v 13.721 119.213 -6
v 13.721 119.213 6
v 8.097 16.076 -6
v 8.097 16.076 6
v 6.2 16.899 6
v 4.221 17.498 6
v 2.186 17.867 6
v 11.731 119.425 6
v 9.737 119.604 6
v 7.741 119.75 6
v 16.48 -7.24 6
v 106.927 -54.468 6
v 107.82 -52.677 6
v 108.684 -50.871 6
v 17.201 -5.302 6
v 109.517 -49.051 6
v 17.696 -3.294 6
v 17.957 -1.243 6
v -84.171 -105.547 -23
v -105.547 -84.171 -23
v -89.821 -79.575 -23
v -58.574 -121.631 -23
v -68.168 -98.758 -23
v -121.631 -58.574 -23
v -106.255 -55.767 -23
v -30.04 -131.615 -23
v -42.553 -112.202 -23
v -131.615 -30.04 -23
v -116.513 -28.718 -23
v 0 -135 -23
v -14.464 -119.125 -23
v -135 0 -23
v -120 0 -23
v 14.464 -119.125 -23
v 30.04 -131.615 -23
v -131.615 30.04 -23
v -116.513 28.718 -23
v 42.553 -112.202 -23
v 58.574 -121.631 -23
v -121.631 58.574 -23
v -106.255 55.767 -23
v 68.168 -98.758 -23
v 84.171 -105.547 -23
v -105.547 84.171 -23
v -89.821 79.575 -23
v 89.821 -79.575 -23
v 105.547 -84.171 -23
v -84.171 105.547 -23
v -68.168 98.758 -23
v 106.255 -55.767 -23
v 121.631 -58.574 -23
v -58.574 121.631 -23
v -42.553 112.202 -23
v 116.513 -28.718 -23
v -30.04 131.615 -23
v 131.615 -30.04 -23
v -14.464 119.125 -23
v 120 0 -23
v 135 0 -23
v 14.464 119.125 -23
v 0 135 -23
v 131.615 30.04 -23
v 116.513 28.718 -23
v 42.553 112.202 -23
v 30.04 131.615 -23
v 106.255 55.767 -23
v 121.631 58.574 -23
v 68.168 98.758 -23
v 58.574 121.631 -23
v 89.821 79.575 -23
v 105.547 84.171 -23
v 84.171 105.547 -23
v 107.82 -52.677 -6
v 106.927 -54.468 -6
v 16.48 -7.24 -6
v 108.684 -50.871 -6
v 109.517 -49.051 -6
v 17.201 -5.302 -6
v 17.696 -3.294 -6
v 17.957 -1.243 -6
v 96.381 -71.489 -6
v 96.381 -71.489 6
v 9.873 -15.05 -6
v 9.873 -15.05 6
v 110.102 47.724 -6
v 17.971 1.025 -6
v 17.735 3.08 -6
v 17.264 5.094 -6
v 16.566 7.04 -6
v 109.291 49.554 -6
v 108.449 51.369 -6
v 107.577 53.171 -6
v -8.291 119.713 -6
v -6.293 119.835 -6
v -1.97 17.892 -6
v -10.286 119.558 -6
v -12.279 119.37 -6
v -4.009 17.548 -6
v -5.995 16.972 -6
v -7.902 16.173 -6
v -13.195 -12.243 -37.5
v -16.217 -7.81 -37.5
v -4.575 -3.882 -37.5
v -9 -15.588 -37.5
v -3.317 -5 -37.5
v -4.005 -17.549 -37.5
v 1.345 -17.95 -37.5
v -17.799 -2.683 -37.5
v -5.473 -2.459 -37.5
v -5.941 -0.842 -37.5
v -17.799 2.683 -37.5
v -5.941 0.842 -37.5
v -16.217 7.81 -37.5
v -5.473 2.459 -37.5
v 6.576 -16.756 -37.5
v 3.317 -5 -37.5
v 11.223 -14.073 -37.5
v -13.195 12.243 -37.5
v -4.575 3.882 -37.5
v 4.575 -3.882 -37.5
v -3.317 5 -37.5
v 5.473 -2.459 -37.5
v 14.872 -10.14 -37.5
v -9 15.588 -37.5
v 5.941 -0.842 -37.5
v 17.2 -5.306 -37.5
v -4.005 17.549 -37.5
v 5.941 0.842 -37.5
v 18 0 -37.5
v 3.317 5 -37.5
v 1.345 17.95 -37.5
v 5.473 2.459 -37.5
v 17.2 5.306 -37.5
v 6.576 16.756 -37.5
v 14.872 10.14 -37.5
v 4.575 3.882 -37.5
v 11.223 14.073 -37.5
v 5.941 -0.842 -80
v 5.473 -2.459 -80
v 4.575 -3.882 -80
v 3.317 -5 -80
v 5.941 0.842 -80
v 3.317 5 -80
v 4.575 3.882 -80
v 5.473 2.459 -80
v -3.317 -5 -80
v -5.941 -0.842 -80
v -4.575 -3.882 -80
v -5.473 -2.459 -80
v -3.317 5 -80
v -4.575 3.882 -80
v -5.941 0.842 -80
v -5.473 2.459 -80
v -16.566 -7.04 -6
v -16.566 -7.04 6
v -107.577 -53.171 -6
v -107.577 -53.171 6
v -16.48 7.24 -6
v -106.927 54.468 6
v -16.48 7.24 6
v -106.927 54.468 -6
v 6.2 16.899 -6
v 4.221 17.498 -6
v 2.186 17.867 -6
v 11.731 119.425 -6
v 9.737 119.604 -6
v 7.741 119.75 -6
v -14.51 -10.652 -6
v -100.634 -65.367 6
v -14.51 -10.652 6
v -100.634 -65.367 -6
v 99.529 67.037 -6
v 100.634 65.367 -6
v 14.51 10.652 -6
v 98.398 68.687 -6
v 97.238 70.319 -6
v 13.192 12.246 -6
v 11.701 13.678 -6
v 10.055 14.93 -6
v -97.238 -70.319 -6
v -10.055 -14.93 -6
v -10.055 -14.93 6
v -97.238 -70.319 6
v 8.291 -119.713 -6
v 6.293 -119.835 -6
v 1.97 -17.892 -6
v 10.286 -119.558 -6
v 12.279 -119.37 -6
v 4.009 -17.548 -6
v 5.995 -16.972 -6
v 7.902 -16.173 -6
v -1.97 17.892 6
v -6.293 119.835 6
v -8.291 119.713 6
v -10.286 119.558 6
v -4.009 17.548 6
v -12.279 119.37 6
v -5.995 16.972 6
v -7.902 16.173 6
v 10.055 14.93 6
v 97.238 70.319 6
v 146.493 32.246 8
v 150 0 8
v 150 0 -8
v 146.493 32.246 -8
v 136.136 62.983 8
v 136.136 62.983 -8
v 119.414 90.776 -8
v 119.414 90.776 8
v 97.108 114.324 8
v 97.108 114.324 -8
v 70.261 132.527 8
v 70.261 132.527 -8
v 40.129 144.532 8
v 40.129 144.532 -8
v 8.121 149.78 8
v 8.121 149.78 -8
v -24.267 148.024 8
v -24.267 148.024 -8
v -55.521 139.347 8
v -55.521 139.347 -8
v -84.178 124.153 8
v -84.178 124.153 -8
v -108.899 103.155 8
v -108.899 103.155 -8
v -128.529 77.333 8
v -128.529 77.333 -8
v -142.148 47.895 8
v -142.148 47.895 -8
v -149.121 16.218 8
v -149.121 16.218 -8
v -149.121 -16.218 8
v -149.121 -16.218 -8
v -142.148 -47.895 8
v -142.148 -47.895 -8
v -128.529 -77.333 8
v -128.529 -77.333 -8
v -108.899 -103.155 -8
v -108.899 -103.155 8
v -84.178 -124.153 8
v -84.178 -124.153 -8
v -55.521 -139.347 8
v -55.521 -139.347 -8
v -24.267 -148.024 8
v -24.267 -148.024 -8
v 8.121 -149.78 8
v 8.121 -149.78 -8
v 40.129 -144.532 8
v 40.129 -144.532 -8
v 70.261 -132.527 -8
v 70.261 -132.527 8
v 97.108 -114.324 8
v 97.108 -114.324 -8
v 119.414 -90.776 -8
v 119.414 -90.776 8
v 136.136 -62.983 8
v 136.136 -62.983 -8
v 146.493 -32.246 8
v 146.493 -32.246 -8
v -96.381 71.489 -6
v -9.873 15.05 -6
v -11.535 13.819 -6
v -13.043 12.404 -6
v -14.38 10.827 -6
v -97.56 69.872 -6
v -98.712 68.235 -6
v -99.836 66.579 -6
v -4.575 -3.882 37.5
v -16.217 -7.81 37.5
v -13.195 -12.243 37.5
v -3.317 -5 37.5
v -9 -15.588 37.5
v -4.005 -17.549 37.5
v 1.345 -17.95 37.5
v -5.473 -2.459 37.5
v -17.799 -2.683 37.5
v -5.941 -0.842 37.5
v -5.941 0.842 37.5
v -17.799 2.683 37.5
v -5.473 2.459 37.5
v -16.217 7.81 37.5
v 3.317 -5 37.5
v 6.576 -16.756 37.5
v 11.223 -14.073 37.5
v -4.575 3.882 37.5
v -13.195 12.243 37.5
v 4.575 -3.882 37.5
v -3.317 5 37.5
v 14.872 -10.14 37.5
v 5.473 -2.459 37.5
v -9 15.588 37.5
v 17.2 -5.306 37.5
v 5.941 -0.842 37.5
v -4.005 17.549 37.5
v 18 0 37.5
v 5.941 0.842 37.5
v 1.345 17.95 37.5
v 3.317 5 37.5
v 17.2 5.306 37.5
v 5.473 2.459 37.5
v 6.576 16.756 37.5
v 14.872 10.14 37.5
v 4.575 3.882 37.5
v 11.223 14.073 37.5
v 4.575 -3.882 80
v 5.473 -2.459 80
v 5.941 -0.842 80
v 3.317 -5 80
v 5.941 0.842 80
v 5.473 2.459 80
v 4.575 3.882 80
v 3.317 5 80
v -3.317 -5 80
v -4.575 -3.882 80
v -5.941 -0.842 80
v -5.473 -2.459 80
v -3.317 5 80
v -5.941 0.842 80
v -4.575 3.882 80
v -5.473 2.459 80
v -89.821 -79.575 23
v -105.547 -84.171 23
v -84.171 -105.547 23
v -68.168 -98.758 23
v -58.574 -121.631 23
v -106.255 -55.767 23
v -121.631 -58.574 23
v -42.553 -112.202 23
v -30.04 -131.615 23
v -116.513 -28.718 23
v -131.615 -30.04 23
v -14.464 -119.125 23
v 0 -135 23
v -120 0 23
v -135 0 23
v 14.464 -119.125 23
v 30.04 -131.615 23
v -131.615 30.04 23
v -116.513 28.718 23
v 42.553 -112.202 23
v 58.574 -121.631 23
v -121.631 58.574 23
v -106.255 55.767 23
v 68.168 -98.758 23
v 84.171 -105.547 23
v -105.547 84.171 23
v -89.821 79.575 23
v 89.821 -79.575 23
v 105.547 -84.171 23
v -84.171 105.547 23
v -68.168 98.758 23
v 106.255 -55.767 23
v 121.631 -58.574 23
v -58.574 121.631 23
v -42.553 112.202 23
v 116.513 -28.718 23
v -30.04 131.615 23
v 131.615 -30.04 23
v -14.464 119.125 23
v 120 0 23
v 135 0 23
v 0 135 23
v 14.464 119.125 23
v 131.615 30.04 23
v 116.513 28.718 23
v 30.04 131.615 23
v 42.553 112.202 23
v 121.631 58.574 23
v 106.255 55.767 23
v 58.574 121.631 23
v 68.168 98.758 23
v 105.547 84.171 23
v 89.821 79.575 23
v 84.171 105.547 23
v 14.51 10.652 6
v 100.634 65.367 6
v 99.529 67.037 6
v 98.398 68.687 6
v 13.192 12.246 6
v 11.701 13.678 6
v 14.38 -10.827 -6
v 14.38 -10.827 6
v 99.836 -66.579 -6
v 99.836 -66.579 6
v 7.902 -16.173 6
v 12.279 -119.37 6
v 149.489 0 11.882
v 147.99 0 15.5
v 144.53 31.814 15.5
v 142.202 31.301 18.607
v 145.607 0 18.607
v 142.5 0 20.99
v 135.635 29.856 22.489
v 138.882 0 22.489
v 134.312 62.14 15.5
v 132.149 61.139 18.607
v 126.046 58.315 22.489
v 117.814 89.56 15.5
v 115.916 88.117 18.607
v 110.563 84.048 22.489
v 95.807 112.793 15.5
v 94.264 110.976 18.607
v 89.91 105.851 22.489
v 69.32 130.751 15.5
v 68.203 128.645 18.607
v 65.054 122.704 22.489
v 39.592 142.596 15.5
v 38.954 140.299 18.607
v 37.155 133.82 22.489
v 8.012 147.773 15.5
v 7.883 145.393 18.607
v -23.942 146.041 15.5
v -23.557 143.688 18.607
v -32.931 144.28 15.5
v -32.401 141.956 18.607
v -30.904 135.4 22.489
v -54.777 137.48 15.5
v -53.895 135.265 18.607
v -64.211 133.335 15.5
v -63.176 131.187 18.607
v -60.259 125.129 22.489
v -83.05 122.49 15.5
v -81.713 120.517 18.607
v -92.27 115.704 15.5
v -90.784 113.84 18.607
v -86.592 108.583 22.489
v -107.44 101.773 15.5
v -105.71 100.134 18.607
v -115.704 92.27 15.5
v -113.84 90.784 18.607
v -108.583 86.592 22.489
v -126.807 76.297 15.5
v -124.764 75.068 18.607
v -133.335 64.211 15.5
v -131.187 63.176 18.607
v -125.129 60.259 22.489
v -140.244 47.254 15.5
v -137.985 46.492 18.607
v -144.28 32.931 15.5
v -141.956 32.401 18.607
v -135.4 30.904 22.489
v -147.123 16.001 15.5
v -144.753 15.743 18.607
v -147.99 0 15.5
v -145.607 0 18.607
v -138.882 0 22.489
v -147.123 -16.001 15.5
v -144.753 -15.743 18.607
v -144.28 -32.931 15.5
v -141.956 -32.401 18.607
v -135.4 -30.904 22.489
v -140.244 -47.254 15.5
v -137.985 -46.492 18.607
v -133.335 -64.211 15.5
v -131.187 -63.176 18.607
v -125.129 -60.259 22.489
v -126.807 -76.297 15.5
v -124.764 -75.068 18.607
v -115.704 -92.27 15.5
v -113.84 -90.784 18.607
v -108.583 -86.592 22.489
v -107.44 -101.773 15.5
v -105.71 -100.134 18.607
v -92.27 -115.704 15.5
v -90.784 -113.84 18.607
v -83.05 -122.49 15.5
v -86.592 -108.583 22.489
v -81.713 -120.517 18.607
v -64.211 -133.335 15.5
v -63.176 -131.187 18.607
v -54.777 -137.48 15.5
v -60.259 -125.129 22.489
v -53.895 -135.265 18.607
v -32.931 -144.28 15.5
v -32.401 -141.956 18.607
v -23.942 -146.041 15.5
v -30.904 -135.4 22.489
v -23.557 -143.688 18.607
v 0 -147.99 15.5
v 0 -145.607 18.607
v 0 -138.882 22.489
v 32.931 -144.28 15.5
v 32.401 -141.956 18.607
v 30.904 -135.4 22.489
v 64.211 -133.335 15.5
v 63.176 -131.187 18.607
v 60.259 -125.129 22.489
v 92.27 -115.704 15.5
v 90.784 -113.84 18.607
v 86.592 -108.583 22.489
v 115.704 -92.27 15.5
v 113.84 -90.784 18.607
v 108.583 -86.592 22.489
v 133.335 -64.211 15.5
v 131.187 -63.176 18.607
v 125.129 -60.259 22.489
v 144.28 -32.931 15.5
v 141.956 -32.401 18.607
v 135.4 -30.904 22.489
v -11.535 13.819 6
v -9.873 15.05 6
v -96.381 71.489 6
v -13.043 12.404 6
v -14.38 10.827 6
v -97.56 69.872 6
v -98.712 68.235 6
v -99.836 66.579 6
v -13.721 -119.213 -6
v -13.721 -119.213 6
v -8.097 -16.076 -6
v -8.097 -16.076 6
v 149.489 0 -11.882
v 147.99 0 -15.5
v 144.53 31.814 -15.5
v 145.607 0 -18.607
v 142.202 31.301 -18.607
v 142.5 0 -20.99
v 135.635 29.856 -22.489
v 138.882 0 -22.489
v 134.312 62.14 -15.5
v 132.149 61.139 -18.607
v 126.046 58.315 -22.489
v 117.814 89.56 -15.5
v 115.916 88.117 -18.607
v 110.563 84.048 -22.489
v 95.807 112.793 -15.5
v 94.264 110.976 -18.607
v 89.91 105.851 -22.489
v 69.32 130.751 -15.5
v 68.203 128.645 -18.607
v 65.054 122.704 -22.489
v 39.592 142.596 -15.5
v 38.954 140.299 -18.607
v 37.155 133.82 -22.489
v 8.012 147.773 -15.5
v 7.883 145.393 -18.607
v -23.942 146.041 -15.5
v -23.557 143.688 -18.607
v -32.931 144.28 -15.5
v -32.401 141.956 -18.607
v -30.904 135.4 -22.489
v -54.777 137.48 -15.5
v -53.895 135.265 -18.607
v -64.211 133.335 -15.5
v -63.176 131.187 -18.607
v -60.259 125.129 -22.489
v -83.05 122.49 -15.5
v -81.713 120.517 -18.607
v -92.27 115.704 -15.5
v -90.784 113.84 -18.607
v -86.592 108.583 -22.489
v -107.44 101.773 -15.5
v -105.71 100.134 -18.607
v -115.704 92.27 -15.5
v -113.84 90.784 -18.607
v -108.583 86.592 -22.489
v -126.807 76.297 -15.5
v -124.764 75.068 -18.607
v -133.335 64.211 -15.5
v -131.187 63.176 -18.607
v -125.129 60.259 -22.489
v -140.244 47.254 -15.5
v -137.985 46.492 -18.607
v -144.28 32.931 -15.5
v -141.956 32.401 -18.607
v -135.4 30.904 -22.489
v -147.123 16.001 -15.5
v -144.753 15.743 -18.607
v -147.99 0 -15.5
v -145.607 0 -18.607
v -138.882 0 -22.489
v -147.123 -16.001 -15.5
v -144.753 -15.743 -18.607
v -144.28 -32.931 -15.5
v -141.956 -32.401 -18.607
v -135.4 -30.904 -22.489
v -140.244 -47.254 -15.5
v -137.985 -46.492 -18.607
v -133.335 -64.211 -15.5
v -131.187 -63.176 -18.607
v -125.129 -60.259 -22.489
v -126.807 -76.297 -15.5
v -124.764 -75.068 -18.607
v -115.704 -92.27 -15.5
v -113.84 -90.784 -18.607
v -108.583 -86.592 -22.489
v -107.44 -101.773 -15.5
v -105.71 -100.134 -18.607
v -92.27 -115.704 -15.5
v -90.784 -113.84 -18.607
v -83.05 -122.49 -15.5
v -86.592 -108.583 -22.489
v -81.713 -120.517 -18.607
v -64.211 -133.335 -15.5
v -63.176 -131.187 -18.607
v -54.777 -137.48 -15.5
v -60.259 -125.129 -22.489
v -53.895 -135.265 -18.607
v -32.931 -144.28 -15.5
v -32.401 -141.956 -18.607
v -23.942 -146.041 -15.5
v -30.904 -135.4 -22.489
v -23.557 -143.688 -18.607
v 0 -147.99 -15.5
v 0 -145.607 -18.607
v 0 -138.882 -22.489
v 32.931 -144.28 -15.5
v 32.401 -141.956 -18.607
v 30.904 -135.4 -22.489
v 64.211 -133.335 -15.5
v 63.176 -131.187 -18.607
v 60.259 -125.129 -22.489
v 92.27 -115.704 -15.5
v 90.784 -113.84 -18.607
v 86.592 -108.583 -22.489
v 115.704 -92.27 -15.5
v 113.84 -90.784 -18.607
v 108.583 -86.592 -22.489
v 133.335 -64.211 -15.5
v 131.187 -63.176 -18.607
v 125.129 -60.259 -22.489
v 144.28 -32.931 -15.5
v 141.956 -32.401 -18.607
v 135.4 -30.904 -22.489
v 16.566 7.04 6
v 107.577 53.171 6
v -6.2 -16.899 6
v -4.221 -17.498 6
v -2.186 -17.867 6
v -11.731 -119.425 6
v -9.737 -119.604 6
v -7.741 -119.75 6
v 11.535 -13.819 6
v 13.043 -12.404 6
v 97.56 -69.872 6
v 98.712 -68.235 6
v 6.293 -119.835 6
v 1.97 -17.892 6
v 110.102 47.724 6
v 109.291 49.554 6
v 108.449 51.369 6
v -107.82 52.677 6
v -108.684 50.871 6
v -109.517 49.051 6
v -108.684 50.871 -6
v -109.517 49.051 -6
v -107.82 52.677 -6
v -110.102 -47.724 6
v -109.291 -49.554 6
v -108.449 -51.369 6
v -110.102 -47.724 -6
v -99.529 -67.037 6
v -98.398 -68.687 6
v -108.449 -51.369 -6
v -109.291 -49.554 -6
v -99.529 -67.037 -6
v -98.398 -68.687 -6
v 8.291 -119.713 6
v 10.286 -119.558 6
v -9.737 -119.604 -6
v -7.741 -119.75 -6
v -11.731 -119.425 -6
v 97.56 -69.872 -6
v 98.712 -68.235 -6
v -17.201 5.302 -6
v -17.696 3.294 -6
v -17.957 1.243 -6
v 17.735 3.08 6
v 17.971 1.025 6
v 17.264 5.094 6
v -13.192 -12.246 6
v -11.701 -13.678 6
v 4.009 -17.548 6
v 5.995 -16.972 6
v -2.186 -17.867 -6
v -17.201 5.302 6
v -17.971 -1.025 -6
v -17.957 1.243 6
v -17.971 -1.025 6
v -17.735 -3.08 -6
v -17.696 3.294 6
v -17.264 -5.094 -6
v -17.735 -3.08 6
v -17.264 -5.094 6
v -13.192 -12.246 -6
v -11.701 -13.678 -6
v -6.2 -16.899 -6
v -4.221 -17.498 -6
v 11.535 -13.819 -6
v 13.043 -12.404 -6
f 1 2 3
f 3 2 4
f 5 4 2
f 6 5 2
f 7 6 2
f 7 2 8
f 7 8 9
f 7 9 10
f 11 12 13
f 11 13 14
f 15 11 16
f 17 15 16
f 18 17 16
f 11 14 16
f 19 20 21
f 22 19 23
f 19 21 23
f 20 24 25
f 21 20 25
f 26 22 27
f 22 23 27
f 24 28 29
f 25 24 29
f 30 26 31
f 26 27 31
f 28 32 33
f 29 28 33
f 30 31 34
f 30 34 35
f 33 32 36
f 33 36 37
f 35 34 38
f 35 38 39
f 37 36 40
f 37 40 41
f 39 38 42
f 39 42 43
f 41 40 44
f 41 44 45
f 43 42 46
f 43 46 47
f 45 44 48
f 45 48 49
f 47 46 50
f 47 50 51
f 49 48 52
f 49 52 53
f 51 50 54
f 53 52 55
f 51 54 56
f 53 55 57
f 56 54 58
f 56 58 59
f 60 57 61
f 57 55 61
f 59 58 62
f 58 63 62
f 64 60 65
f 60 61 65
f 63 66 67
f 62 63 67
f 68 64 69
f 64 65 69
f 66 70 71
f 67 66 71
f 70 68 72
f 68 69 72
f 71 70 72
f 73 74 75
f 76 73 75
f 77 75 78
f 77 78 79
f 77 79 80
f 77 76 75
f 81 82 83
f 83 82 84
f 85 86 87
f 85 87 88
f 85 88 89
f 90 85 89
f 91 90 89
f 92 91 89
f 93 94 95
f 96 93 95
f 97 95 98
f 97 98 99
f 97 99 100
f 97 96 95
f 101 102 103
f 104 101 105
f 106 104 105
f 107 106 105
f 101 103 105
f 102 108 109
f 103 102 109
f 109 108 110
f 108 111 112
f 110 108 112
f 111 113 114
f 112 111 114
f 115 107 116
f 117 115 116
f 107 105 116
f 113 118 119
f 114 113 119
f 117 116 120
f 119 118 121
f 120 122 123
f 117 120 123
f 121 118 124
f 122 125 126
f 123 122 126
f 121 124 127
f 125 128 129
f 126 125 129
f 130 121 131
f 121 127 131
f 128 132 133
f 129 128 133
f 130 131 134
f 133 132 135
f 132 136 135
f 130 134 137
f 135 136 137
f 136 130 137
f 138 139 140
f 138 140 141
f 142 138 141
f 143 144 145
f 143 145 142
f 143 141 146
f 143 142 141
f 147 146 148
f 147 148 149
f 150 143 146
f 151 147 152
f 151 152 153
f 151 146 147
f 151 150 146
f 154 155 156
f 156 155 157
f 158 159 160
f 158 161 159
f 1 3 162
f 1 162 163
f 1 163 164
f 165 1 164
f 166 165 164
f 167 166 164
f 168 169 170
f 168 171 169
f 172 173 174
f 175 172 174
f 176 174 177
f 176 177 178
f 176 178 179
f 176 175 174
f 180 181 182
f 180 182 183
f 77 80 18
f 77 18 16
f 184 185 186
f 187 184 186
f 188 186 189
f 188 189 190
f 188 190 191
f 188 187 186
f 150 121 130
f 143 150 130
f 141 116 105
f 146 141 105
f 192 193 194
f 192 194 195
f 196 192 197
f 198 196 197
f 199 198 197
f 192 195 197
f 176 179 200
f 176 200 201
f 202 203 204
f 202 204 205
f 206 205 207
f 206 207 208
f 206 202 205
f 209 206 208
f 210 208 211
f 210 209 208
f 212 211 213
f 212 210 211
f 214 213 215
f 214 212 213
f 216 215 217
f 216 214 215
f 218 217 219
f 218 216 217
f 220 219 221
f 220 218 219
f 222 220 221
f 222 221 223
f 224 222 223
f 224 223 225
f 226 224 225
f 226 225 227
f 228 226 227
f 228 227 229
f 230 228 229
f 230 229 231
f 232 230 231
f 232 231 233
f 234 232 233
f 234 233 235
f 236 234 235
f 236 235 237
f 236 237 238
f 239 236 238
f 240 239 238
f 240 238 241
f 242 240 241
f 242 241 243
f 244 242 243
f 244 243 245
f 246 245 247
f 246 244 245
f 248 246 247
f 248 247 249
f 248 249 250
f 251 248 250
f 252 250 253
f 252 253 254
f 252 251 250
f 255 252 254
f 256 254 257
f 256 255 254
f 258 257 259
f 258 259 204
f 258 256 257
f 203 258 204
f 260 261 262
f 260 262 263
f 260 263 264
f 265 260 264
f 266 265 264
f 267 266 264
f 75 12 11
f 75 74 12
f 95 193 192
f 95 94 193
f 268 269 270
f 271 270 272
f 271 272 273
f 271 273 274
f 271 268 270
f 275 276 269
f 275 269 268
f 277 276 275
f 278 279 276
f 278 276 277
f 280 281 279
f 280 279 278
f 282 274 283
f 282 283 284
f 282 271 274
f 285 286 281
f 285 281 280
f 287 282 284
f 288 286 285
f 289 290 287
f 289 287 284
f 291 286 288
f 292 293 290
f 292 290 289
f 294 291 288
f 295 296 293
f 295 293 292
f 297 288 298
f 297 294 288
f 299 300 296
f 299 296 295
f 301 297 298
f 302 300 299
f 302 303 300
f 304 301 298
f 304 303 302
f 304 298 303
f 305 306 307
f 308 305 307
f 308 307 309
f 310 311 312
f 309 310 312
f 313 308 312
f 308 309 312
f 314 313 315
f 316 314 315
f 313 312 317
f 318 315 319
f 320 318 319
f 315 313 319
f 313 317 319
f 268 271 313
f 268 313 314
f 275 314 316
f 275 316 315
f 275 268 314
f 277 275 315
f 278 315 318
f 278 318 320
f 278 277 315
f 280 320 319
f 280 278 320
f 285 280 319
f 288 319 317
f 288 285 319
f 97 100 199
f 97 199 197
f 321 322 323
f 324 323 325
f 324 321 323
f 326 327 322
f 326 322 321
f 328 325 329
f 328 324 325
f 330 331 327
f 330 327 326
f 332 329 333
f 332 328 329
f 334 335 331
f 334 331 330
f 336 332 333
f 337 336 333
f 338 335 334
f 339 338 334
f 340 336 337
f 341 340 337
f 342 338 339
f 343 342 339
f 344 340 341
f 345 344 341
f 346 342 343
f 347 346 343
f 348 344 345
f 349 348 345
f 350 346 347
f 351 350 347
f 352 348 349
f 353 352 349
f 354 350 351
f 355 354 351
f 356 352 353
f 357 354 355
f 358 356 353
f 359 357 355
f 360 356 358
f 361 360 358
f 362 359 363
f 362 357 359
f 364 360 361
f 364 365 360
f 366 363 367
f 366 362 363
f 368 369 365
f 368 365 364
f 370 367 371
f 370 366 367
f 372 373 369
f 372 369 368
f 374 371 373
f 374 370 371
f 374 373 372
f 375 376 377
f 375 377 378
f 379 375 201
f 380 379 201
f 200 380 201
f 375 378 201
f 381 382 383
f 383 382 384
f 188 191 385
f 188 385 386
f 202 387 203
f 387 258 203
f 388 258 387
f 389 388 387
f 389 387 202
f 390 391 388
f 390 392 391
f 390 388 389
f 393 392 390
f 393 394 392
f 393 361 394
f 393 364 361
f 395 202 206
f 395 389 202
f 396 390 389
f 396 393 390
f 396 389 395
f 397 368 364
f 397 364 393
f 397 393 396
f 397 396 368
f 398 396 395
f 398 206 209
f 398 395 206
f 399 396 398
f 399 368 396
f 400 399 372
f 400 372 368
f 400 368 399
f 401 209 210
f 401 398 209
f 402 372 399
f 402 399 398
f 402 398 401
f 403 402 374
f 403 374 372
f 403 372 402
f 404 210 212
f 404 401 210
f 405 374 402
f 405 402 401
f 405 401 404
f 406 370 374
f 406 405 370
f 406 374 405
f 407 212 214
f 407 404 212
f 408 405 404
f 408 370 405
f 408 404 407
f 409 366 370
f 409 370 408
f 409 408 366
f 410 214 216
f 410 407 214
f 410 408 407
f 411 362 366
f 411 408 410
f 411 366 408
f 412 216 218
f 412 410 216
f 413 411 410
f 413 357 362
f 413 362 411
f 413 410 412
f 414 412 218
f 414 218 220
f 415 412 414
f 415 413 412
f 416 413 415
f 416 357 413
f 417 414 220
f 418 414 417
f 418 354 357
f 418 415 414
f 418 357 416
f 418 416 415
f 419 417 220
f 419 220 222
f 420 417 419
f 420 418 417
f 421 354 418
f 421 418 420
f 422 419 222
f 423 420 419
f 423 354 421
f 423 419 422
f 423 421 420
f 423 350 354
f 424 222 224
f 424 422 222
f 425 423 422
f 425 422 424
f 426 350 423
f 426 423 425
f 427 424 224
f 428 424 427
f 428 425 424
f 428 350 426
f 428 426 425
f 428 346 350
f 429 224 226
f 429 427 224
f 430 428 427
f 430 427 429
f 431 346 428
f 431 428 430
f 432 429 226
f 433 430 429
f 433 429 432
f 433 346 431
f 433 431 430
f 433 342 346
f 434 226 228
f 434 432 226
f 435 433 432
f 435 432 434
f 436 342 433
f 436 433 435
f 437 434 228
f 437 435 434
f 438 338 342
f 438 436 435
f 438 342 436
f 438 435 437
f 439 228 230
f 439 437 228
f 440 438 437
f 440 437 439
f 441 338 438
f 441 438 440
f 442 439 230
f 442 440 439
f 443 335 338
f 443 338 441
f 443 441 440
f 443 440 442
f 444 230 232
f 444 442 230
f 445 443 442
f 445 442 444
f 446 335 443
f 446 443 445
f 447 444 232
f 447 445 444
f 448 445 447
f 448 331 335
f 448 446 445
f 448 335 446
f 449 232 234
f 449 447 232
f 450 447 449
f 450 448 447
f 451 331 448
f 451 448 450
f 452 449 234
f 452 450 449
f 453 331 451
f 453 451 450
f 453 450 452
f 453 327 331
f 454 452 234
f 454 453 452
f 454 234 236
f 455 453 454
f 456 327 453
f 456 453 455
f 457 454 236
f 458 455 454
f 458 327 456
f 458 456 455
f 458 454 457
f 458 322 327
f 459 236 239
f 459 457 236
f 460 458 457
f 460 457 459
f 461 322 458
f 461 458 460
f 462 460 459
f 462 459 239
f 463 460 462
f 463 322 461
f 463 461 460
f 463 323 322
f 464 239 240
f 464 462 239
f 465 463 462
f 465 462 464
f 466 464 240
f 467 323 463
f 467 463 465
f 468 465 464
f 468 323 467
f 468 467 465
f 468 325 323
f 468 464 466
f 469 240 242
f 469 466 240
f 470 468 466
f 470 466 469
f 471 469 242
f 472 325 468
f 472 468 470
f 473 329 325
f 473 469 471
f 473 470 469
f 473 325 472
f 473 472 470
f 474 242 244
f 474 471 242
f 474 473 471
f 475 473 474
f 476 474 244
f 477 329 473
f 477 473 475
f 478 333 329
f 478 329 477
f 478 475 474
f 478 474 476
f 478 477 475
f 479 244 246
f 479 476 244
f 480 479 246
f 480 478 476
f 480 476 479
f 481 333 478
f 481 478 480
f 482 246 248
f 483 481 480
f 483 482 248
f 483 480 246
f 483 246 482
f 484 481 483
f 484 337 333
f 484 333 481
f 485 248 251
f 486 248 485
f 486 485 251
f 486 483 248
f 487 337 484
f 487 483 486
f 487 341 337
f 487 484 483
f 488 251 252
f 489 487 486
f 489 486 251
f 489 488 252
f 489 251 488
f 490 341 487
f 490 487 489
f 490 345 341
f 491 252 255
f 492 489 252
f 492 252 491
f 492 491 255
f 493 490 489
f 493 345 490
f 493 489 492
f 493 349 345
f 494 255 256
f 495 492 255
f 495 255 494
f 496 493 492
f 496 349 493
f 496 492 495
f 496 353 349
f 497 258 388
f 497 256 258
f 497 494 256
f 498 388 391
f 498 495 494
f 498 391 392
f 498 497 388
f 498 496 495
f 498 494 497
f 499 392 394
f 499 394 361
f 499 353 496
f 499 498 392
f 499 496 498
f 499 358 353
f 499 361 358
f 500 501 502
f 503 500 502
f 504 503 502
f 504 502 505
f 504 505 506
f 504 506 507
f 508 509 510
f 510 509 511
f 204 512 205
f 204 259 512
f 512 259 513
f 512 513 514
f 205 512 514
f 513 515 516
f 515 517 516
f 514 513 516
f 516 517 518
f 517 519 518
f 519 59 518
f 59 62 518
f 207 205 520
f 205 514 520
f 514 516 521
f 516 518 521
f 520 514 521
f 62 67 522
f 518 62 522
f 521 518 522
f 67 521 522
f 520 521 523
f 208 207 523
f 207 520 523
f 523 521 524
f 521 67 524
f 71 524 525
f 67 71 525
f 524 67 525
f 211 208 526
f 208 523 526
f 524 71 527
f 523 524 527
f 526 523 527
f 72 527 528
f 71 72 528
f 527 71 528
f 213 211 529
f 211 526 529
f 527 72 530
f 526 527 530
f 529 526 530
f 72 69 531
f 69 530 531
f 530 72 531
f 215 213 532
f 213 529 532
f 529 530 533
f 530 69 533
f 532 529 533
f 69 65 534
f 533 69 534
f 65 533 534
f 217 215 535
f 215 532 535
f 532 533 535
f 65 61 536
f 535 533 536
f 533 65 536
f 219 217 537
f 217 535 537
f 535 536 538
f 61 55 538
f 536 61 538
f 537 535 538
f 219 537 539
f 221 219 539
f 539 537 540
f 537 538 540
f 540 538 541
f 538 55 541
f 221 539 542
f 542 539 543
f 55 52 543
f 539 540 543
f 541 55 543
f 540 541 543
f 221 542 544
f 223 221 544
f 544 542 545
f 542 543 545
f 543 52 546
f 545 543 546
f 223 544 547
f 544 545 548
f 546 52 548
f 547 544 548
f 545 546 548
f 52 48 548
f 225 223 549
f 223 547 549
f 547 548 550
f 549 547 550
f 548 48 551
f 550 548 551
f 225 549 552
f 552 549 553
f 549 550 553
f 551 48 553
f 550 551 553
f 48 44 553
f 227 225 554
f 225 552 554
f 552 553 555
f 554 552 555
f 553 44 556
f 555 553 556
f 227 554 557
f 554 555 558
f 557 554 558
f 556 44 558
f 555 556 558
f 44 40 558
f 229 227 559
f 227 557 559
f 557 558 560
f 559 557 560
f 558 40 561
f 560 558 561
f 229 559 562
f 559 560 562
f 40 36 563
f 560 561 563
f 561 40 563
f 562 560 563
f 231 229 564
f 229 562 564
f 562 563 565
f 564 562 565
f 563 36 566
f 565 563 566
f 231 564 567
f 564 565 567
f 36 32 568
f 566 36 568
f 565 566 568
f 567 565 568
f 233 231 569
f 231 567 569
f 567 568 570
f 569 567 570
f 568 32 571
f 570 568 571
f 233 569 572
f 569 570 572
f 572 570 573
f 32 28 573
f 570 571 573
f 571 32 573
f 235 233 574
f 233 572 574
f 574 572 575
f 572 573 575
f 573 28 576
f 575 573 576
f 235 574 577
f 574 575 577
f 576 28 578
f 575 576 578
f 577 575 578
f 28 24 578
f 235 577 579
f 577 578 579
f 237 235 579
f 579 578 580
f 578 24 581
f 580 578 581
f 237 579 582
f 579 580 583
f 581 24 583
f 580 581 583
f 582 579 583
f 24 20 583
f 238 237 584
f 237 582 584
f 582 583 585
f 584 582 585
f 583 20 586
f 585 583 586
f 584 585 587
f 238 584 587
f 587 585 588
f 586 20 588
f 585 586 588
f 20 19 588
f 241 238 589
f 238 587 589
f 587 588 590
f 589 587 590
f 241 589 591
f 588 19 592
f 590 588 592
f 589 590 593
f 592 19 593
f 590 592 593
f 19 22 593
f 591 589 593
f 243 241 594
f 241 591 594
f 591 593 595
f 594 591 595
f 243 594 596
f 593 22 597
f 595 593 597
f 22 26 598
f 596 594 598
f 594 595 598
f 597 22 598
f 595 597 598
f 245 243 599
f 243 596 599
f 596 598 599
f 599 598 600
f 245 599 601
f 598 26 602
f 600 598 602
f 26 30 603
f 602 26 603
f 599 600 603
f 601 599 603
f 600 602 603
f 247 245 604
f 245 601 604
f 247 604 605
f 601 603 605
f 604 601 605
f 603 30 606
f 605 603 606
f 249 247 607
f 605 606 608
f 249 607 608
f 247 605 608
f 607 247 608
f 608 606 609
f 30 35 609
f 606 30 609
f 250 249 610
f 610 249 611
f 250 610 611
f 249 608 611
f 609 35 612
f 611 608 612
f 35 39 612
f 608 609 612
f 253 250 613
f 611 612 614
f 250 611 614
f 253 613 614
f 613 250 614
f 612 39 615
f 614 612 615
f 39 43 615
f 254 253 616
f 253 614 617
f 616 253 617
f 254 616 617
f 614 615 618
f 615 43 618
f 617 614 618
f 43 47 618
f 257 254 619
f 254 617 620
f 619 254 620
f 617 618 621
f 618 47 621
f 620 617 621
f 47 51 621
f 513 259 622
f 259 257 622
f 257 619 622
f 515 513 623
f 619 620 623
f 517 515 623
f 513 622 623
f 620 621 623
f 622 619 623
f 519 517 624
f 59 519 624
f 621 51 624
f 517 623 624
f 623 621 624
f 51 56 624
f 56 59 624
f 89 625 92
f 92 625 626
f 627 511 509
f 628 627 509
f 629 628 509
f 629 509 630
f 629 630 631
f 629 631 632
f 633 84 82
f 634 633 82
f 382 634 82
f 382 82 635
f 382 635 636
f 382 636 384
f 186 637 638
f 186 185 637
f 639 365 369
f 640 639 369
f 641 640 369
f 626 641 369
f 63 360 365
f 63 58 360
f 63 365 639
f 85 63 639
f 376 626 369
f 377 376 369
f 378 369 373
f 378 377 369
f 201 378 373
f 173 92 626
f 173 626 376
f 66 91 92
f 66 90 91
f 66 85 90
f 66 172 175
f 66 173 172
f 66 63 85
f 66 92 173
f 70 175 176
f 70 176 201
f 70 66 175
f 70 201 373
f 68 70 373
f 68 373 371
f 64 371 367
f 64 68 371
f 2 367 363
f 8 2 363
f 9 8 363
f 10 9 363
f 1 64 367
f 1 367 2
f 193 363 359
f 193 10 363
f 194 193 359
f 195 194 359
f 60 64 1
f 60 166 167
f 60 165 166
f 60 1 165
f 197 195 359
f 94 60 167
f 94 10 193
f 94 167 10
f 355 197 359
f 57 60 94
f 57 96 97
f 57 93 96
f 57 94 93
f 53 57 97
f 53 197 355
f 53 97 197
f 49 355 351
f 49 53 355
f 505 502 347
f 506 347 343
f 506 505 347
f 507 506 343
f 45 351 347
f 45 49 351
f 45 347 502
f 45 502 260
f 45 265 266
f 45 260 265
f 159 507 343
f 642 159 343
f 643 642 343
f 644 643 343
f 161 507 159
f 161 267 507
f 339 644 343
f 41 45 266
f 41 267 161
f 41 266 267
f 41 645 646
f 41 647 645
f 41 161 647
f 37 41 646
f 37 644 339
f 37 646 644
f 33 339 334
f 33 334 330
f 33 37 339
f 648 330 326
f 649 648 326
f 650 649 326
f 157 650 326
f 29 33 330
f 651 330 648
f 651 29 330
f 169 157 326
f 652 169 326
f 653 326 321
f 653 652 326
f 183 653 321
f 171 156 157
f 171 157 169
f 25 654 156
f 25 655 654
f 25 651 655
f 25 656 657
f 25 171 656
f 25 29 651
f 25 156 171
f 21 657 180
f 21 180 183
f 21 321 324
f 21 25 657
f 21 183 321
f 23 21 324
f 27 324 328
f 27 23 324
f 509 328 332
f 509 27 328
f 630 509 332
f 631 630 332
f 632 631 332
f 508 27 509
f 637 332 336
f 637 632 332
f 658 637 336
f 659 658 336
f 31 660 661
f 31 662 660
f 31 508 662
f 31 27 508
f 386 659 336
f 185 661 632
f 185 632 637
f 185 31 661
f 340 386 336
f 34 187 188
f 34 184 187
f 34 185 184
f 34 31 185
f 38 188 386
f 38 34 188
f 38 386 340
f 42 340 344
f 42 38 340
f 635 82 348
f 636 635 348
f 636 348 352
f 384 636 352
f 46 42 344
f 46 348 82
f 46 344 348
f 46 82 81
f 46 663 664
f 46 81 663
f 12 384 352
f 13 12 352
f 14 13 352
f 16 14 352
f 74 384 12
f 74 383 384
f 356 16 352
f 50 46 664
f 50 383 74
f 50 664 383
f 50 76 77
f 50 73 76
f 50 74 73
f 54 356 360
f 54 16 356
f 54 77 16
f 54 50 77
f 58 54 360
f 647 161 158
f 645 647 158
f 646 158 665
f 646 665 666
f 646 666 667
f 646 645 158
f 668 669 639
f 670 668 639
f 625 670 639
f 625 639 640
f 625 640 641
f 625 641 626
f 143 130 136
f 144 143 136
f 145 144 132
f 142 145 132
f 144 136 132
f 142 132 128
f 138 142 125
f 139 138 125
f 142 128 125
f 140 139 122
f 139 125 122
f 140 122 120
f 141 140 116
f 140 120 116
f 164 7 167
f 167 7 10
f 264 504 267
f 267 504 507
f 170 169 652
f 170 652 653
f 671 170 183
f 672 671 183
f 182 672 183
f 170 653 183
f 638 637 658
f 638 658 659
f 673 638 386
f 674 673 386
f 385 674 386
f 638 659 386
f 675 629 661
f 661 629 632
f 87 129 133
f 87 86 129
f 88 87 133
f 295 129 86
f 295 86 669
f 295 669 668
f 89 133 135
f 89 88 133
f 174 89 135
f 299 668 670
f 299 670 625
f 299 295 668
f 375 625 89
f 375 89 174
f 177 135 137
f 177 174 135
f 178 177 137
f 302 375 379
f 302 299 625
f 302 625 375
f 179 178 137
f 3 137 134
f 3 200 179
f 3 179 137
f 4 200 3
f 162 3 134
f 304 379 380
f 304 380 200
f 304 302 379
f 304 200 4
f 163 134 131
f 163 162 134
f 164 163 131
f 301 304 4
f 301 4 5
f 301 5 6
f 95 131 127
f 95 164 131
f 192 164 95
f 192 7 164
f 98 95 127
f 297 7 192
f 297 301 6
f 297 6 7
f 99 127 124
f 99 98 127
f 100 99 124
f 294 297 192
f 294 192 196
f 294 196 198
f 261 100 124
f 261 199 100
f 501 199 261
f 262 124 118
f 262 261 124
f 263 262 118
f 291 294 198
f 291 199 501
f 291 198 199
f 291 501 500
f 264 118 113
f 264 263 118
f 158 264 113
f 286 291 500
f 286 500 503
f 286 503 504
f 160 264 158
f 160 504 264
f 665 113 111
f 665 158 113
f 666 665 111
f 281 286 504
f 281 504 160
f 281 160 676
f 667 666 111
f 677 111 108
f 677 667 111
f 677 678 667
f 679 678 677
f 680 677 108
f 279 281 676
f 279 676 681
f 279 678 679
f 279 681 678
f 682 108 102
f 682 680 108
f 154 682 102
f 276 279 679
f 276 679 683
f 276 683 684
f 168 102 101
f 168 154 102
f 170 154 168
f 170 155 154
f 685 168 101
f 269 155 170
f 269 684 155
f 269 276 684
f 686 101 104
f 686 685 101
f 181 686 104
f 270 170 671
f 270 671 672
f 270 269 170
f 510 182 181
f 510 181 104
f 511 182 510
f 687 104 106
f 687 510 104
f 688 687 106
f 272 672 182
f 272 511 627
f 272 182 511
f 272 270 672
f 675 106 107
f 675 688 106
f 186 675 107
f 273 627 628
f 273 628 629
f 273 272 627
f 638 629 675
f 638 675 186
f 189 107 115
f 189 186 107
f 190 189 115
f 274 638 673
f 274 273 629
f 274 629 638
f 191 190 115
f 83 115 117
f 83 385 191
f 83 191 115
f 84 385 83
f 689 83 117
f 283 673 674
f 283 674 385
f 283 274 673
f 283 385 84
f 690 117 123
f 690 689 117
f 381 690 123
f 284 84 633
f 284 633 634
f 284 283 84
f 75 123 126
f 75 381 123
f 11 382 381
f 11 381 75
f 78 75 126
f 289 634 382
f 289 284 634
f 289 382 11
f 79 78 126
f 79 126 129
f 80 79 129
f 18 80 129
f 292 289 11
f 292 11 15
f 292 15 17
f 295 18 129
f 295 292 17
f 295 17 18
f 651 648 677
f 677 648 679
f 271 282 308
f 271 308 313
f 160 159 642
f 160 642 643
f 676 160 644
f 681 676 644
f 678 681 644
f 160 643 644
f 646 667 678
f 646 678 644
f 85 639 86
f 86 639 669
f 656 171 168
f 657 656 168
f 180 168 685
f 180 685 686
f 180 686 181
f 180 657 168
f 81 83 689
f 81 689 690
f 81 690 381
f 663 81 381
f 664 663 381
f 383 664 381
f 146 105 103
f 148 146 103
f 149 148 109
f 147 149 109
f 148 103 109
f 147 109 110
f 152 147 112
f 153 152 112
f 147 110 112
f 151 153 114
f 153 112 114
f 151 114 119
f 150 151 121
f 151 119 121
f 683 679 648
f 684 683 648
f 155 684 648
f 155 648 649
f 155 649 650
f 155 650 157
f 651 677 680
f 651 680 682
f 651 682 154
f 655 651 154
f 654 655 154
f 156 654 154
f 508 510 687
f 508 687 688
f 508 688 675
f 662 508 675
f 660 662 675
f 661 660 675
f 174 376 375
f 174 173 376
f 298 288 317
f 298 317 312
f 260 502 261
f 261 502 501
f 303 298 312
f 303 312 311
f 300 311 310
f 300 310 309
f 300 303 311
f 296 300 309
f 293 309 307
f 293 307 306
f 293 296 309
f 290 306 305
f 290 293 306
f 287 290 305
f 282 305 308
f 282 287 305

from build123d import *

# Parameters (mm, degrees)
SKETCH1_R           = 18
BOSS_EXTRUDE1_DEPTH = 37.5
SKETCH2_R           = 150
SKETCH2_R_2         = 120
BOSS_EXTRUDE2_DEPTH = 23
BOSS_EXTRUDE3_DEPTH = 6
CIRPATTERN15_COUNT  = 6
FILLET1_R           = 15
BOSS_EXTRUDE4_DEPTH = 42.5


with BuildPart() as part:
    # Sketch1 → Boss-Extrude1 (new, symmetric)
    with BuildSketch(Plane.XY):
        Circle(SKETCH1_R)
    extrude(amount=BOSS_EXTRUDE1_DEPTH, both=True)



with BuildPart() as body_2:
    # Sketch2 → Boss-Extrude2 (new, symmetric)
    with BuildSketch(Plane.XY):
        Circle(SKETCH2_R)
        Circle(SKETCH2_R_2, mode=Mode.SUBTRACT)
    extrude(amount=BOSS_EXTRUDE2_DEPTH, both=True)


with BuildPart() as part_1:
    add(part.part)

    add(body_2.part)  # Boss-Extrude3 merges body 2
    # Sketch3 → Boss-Extrude3 (add, symmetric)
    with BuildSketch(Plane.XY):
        with BuildLine():
            Line((-6.292975555, 119.834879975), (-1.969902622, 17.891883178))
            ThreePointArc((-1.969902622, 17.891883178), (-5.010440879, 17.288593991), (-7.902385067, 16.172578961))
            Line((-7.902385067, 16.172578961), (-12.278660753, 119.370157452))
            ThreePointArc((-12.278660753, 119.370157452), (-9.288724915, 119.639958164), (-6.292975555, 119.834879975))
        make_face()
        with BuildLine():
            Line((13.720864234, 119.212993774), (8.097322617, 16.075862852))
            ThreePointArc((8.097322617, 16.075862852), (5.2190816, 17.226757886), (2.18605888, 17.866760942))
            Line((2.18605888, 17.866760942), (7.741234625, 119.750045037))
            ThreePointArc((7.741234625, 119.750045037), (10.734408595, 119.51892098), (13.720864234, 119.212993774))
        make_face()
    boss_extrude3 = extrude(amount=BOSS_EXTRUDE3_DEPTH, both=True)

    # CirPattern15: Boss-Extrude3 ×6 about axis
    cirpattern15_axis = Axis((0, 0, -53.35), (0, 0, 1))
    for i in range(1, CIRPATTERN15_COUNT):
        add(boss_extrude3.rotate(cirpattern15_axis, i * 360 / CIRPATTERN15_COUNT))

    # Fillet1
    fillet1_edges = [part_1.edges().sort_by_distance(p)[0] for p in [
        (-150, 0, -23),
        (-150, 0, 23),
    ]]
    fillet(fillet1_edges, radius=FILLET1_R)

    # Sketch5 → Boss-Extrude4 (add)
    with BuildSketch(Plane.XY.offset(37.5)):
        with BuildLine():
            Line((-3.31662479, 5), (3.31662479, 5))
            ThreePointArc((3.31662479, 5), (6, 0), (3.31662479, -5))
            Line((3.31662479, -5), (-3.31662479, -5))
            ThreePointArc((-3.31662479, -5), (-6, 0), (-3.31662479, 5))
        make_face()
    boss_extrude4 = extrude(amount=BOSS_EXTRUDE4_DEPTH)

    # Mirror1: Boss-Extrude4 across plane
    add(boss_extrude4.mirror(Plane.XY))


solid = part_1.part
